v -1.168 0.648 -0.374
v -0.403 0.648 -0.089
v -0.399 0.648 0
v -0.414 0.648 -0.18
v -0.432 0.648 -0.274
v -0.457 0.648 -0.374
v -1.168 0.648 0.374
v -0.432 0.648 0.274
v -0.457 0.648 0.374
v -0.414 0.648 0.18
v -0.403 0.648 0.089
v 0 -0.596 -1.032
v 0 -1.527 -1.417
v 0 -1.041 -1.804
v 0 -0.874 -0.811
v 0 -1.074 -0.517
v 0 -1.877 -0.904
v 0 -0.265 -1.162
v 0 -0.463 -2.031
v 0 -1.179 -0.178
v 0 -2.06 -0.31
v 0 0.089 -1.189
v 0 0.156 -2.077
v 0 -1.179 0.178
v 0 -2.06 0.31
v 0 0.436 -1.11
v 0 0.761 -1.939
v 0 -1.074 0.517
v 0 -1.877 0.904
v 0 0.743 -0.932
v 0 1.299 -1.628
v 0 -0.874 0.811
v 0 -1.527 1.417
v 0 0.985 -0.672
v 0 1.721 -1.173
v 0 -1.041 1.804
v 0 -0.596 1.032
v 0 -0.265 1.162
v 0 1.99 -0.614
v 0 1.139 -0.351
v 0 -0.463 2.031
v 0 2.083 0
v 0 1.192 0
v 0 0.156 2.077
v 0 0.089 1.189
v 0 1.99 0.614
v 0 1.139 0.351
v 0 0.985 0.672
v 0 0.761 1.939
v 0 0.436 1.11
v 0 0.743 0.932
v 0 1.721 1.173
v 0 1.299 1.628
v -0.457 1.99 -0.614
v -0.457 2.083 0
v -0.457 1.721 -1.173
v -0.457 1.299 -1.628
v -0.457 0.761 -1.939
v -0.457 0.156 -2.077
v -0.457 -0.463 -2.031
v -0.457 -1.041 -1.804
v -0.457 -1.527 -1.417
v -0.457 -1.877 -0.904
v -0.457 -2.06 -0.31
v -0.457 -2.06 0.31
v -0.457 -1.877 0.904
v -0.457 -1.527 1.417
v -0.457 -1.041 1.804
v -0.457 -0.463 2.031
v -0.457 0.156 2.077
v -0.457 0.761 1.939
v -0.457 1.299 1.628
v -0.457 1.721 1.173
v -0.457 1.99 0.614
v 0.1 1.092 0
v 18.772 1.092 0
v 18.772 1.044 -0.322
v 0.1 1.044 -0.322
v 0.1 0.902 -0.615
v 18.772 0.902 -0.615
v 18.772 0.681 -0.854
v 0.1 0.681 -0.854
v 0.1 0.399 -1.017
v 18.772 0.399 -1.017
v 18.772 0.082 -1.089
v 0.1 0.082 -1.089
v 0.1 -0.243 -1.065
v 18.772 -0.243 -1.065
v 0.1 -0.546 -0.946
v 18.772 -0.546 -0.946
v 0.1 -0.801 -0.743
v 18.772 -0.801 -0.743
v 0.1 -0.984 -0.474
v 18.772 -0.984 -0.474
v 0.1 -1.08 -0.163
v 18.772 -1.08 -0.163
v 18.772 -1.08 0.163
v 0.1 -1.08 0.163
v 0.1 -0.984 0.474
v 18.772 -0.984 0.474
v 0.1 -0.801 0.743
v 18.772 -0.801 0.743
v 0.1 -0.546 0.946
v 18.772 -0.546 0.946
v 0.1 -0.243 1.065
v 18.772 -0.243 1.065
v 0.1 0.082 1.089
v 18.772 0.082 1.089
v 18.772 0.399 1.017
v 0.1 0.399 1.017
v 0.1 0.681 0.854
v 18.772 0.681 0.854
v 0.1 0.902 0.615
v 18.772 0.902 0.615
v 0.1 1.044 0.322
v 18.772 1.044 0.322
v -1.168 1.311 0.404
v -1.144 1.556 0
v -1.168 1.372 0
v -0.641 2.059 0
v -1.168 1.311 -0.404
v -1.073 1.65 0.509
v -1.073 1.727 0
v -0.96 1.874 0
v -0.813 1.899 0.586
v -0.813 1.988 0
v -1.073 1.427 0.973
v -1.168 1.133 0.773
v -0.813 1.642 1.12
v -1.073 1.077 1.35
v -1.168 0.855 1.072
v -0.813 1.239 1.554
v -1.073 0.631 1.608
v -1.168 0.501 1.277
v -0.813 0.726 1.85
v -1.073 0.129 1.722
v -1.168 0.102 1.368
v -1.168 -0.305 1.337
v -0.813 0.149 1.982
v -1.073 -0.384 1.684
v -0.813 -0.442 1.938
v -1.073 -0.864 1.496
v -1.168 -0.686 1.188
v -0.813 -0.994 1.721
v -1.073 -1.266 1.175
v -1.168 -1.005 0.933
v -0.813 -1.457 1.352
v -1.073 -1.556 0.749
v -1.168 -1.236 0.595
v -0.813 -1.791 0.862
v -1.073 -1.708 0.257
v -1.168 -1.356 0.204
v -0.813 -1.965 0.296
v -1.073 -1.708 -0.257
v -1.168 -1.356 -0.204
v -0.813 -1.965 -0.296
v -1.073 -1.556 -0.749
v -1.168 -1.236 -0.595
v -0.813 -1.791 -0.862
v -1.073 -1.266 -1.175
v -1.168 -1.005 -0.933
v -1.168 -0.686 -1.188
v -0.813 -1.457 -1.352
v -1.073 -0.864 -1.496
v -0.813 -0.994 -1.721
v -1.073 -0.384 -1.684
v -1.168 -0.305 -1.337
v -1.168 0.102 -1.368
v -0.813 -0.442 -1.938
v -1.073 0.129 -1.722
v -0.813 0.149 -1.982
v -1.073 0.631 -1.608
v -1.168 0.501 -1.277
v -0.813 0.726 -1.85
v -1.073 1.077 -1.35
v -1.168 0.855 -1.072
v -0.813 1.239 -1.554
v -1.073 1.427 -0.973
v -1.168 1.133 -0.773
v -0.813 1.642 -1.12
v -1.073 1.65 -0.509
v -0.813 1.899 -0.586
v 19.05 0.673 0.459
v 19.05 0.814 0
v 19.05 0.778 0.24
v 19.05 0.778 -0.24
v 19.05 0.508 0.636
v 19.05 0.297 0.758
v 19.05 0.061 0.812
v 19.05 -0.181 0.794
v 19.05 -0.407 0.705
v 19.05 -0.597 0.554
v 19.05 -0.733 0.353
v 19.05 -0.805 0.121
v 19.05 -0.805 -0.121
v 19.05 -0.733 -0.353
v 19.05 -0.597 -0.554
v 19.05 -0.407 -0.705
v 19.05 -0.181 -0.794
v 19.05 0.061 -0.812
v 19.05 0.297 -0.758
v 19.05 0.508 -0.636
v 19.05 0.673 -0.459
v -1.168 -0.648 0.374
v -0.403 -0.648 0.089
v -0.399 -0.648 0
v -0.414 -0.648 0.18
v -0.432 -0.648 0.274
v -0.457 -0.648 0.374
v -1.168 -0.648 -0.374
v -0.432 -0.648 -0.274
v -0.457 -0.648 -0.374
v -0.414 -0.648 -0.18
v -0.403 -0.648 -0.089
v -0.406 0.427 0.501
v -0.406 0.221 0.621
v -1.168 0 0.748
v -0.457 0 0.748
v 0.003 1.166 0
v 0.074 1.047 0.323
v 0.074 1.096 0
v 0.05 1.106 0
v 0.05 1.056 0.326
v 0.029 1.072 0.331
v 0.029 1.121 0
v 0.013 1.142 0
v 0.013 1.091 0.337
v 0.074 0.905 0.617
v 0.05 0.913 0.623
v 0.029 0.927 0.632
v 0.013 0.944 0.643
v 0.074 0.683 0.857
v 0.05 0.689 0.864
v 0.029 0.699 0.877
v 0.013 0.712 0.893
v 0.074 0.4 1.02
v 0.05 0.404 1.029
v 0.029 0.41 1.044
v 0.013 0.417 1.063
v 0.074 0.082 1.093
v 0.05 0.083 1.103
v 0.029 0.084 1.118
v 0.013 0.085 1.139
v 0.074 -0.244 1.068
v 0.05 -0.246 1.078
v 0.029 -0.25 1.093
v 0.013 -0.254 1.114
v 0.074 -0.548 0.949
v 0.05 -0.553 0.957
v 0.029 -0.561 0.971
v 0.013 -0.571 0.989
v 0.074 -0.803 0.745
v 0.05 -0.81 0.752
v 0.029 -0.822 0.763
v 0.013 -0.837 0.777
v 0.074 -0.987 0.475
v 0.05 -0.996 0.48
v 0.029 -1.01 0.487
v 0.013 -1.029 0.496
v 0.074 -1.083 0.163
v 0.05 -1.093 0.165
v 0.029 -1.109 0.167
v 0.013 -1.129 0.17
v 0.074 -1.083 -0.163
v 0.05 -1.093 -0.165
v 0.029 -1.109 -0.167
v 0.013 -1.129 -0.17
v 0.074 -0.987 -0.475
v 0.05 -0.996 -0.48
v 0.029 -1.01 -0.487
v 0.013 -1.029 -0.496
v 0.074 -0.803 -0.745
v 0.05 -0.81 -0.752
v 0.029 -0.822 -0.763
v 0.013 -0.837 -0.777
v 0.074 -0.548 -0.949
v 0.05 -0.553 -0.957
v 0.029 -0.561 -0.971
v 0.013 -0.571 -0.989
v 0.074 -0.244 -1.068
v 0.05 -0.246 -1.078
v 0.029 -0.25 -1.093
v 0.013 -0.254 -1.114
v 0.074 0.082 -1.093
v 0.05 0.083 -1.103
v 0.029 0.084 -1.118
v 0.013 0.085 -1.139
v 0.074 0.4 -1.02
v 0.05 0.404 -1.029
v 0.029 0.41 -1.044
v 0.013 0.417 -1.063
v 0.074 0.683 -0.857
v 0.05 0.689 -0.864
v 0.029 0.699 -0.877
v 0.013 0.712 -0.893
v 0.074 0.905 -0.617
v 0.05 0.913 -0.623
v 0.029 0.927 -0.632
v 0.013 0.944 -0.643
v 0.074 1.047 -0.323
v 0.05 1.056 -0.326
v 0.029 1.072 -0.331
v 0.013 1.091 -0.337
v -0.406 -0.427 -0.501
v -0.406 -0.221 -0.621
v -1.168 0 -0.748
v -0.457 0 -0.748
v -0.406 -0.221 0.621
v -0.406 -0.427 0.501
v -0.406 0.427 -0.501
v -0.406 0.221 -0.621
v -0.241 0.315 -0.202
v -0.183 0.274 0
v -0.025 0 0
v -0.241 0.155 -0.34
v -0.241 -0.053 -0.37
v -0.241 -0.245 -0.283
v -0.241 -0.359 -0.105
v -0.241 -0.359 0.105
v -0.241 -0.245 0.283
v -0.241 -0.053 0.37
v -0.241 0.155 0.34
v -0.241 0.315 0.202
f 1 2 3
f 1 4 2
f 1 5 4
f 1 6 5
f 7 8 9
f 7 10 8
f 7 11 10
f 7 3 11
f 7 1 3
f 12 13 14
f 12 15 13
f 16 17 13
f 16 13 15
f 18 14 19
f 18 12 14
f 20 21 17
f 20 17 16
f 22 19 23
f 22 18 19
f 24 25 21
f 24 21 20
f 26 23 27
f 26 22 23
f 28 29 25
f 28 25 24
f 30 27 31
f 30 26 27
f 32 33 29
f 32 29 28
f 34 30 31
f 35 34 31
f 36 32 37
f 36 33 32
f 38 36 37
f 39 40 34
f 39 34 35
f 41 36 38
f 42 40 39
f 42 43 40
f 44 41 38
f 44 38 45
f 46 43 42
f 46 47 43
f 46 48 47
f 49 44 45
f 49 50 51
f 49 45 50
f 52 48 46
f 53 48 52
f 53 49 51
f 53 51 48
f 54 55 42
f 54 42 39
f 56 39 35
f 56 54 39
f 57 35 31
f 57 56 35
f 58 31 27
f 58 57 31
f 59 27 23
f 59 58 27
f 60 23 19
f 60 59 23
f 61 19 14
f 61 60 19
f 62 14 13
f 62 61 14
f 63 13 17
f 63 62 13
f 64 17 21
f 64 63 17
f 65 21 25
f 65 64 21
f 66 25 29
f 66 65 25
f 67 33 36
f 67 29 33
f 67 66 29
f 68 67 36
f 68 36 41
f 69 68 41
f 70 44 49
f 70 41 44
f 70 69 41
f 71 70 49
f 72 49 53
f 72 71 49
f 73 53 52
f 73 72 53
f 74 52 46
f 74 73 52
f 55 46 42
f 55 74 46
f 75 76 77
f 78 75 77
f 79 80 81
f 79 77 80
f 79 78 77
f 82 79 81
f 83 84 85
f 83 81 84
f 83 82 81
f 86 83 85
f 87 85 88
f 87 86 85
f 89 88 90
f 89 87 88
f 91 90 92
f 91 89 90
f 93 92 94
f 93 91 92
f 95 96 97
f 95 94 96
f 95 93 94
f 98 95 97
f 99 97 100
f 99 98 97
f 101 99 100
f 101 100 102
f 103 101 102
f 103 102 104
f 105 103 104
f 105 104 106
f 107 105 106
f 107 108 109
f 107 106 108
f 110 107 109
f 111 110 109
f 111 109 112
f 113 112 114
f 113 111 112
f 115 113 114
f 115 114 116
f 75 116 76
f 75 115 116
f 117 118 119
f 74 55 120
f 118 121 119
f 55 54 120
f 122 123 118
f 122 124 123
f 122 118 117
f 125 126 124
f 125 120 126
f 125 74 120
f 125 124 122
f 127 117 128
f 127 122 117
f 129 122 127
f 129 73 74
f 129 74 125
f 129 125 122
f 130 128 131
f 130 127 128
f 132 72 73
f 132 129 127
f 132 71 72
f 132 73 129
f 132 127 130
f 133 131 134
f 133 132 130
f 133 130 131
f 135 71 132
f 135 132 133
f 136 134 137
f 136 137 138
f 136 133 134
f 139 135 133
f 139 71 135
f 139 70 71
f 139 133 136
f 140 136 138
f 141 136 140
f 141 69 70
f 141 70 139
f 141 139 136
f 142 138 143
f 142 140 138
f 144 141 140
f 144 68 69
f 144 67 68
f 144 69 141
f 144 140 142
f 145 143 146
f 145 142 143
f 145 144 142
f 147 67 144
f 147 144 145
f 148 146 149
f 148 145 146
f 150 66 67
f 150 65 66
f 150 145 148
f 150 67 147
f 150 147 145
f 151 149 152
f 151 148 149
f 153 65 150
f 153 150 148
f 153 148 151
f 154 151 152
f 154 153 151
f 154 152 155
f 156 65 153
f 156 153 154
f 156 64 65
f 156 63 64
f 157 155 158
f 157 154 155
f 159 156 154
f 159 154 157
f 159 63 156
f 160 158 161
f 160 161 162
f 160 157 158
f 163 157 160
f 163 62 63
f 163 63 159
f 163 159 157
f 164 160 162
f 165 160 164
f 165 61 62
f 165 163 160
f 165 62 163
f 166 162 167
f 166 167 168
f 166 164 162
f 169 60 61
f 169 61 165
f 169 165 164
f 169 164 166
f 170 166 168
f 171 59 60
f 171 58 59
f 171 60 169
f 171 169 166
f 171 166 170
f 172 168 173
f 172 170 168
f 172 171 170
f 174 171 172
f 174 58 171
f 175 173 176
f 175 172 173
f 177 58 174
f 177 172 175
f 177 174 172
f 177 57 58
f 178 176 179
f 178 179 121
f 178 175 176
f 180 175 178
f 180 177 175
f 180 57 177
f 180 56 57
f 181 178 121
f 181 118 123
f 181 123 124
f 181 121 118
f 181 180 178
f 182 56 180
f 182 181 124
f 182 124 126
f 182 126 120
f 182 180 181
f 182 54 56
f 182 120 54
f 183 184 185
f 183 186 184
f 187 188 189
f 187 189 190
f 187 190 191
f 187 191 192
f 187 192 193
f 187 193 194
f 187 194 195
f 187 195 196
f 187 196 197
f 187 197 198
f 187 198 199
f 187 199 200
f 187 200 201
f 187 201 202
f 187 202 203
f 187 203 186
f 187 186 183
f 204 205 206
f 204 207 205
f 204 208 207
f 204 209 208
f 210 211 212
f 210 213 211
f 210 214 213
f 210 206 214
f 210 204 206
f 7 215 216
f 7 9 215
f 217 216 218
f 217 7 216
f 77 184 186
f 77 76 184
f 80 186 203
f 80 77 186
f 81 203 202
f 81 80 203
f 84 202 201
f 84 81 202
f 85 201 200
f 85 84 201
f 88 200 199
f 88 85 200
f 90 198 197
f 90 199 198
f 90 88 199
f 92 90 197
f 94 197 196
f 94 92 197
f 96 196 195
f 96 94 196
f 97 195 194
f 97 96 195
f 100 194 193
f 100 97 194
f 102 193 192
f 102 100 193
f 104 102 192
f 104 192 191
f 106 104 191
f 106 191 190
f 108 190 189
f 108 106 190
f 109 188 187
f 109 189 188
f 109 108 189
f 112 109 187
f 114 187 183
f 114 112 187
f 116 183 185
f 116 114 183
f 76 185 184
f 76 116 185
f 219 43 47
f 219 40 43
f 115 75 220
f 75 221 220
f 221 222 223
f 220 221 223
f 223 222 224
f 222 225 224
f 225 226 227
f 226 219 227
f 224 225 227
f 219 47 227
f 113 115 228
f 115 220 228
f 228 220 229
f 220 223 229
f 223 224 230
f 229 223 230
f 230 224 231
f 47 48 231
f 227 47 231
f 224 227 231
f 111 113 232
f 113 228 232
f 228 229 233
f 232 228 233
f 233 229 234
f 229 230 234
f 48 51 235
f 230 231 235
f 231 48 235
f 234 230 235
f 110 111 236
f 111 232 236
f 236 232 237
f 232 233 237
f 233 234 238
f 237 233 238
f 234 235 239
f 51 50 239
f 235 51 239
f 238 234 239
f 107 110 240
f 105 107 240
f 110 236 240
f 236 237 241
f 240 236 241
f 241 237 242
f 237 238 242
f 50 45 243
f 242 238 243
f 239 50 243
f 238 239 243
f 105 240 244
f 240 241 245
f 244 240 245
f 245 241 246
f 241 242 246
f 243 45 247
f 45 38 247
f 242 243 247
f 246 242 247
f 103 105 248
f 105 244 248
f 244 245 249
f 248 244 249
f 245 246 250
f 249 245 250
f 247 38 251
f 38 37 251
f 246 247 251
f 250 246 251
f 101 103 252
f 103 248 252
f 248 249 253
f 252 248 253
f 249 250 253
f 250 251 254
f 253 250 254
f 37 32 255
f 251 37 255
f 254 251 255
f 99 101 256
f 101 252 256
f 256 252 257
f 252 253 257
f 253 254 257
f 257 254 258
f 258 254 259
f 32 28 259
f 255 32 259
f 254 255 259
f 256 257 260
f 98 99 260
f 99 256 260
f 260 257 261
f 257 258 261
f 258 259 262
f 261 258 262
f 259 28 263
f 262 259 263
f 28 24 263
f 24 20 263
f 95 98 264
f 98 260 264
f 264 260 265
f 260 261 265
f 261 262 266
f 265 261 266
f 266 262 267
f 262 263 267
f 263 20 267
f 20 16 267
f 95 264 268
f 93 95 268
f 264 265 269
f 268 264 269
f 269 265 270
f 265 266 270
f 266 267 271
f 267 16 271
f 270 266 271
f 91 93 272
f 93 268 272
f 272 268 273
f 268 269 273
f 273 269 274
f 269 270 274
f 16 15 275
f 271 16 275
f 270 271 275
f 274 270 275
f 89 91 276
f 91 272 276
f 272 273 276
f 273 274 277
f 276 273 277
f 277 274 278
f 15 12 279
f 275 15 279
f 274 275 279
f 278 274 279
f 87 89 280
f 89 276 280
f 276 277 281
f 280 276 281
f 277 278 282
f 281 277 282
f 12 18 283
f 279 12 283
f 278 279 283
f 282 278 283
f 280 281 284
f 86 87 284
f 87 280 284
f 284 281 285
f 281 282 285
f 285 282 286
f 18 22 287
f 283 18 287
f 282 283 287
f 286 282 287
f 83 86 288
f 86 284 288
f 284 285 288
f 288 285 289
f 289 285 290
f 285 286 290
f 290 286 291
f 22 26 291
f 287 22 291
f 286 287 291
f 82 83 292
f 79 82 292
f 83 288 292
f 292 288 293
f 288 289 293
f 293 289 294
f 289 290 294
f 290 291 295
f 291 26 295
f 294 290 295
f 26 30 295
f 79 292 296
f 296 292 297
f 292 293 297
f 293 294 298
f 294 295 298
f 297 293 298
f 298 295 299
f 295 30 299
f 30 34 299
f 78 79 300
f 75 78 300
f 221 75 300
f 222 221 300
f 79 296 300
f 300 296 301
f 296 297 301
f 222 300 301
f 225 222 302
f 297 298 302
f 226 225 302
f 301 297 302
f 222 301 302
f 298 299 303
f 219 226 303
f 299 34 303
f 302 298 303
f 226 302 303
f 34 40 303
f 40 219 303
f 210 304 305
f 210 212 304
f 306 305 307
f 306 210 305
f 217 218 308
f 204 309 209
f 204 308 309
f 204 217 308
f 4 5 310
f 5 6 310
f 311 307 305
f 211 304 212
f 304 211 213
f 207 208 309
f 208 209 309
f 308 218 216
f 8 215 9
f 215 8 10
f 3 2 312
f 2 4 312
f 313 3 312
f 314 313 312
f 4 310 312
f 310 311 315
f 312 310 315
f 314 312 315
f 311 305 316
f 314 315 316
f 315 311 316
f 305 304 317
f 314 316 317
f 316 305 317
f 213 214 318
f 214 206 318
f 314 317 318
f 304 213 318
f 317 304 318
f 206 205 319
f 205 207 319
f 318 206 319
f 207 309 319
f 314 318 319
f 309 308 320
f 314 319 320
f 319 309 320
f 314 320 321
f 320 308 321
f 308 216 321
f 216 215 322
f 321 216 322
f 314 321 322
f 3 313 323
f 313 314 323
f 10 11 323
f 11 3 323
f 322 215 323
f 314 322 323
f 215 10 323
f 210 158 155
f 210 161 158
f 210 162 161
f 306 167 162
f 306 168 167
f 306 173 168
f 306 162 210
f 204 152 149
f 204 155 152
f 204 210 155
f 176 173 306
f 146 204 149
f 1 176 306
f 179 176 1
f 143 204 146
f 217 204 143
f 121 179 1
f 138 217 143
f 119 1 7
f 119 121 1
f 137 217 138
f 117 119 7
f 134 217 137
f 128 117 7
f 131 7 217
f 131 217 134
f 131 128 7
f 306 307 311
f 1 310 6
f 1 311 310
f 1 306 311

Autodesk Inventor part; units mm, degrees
ref_plane "YZ Plane" through (0, 0, 0) normal (1, 0, 0) x (0, 1, 0)
ref_plane "XZ Plane" through (0, 0, 0) normal (0, 1, 0) x (-1, 0, 0)
sketch "Sketch1" plane through (0, 0, 0) normal (0, 0, 1) x (1, 0, 0)
  line L0 (-0.0254, 0) -> (19.05, 0)
  line L1 (19.05, 0) -> (19.05, 1.0922)
  line L2 (19.05, 1.0922) -> (1.016, 1.0922)
  line L3 (1.016, 1.0922) -> (0.1088, 1.0922)
  line L4 (0.1088, 1.0922) -> (0, 1.0922)
  line L5 (0, 1.0922) -> (0, 2.0828)
  line L6 (0, 2.0828) -> (-1.1684, 2.0828)
  line L7 (-1.1684, 2.0828) -> (-1.1684, 0.7479)
  line L8 (-1.1684, 0.7479) -> (-0.4572, 0.7479)
  line L9 (-0.4572, 0.7479) -> (-0.0254, 0)
  line L10 (-5.2121, 0) -> (23.0937, 0) projected
  line L11 (0, -0.4166) -> (0, 2.4994) projected
  line L12 (1.016, 1.0922) -> (0, 1.0922) construction
  dimension "d1" = 18.034
  dimension "d2" = 0.9072
  dimension "d3" = 1.1684
  dimension "d4" = 0.7112
  dimension "d5" = 60
  dimension "d6" = 2.1844
  dimension "d7" = 2.1844
  dimension "d8" = 1.4958
  dimension "d9" = 4.1656
  dimension "d26" = 19.05
revolve "Body" add sketch "Sketch1" angle 360 about axis through (-0.0254, 0, 0) along (1, 0, 0)
sketch "Sketch2" plane through (-1.1684, 0, 0) normal (-1, 0, 0) x (0, 0, 1)
  circle A0 centre (0, 0) radius 0.7479 projected
  line L0 (0, -2.9159) -> (0, 2.9159) projected
  line L1 (-2.9159, 0) -> (2.9159, 0) projected
  line L2 (0.7479, 0) -> (0.3739, -0.6477)
  line L3 (0.3739, -0.6477) -> (-0.3739, -0.6477)
  line L4 (-0.3739, -0.6477) -> (-0.7479, 0)
  line L5 (-0.7479, 0) -> (-0.3739, 0.6477)
  line L6 (-0.3739, 0.6477) -> (0.3739, 0.6477)
  line L7 (0.3739, 0.6477) -> (0.7479, 0)
  point P0 (0, 0)
extrude "Slot" add sketch "Sketch2" against normal up to next contours L7 A0 | A0 L2 | L6 L0 A0 | A0 L0 L3 | L0 L6 A0 | A0 L3 L0 | L4 A0 | A0 L5
fillet "Fillet1" radius 0.7112 1 edges at (-1.1684, -2.0828, 0)
thread "Thread" size "2-56 UNC" class "2A" standard "ANSI Unified Screw Threads" length 18.034
chamfer "Chamfer1" distance 0.2782 distance2 0.2781 1 edges at (19.05, -1.0922, 0) measured on face at (19.05, 0.3142, -0.0722)
ref_plane "Work Plane1" through (29, 0, 0) normal (0, -1, 0) x (1, 0, 0)
fillet "Fillet2" radius 0.1 1 edges at (0, -1.0922, 0)
equation "\"d1\" = GEL"
equation "\"d3\" = KOH"
equation "\"d4\" = INTI"
equation "\"d6\" = GD"
equation "\"d7\" = BDM"
equation "\"d8\" = 1.1547 * SW"
equation "\"d9\" = KOD"
equation "\"d26\" = NLG"
equation "\"d30\" = R"
equation "\"d17\" = RR"
equation "\"d13\" = GEL"
equation "\"d15\" = -0.5 * SPD + 0.5 * GD"
equation "\"d16\" = GUL"
equation "\"GD\" = NND"
equation "\"NLG\" = 19.05"
equation "\"GEL\" = 18.034"
equation "\"KOD\" = 4.1656"
equation "\"KOH\" = 1.1684"
equation "\"INTI\" = 0.7112"
equation "\"GAL\" = 0.90714"
equation "\"GUL\" = 0.27813"
equation "\"BDM\" = NND"
equation "\"SW\" = 1.2954"
equation "\"RR\" = 0.7112"
equation "\"SPD\" = GD1"
equation "\"R\" = 0.1"
equation "\"KR\" = 2.5146"
equation "\"GD1\" = 1.62793"
equation "\"THREADDIA\" = 2.1844"
equation "\"FAWI\" = 45deg"
equation "\"KOH1\" = 0.7112"
equation "\"NND\" = 2.1844"
equation "\"TOA\" = 30deg"
equation "\"E0\" = 1.155 * SW"
properties part number "Unbrako - 2 x 3/4" material "Steel, Mild"
